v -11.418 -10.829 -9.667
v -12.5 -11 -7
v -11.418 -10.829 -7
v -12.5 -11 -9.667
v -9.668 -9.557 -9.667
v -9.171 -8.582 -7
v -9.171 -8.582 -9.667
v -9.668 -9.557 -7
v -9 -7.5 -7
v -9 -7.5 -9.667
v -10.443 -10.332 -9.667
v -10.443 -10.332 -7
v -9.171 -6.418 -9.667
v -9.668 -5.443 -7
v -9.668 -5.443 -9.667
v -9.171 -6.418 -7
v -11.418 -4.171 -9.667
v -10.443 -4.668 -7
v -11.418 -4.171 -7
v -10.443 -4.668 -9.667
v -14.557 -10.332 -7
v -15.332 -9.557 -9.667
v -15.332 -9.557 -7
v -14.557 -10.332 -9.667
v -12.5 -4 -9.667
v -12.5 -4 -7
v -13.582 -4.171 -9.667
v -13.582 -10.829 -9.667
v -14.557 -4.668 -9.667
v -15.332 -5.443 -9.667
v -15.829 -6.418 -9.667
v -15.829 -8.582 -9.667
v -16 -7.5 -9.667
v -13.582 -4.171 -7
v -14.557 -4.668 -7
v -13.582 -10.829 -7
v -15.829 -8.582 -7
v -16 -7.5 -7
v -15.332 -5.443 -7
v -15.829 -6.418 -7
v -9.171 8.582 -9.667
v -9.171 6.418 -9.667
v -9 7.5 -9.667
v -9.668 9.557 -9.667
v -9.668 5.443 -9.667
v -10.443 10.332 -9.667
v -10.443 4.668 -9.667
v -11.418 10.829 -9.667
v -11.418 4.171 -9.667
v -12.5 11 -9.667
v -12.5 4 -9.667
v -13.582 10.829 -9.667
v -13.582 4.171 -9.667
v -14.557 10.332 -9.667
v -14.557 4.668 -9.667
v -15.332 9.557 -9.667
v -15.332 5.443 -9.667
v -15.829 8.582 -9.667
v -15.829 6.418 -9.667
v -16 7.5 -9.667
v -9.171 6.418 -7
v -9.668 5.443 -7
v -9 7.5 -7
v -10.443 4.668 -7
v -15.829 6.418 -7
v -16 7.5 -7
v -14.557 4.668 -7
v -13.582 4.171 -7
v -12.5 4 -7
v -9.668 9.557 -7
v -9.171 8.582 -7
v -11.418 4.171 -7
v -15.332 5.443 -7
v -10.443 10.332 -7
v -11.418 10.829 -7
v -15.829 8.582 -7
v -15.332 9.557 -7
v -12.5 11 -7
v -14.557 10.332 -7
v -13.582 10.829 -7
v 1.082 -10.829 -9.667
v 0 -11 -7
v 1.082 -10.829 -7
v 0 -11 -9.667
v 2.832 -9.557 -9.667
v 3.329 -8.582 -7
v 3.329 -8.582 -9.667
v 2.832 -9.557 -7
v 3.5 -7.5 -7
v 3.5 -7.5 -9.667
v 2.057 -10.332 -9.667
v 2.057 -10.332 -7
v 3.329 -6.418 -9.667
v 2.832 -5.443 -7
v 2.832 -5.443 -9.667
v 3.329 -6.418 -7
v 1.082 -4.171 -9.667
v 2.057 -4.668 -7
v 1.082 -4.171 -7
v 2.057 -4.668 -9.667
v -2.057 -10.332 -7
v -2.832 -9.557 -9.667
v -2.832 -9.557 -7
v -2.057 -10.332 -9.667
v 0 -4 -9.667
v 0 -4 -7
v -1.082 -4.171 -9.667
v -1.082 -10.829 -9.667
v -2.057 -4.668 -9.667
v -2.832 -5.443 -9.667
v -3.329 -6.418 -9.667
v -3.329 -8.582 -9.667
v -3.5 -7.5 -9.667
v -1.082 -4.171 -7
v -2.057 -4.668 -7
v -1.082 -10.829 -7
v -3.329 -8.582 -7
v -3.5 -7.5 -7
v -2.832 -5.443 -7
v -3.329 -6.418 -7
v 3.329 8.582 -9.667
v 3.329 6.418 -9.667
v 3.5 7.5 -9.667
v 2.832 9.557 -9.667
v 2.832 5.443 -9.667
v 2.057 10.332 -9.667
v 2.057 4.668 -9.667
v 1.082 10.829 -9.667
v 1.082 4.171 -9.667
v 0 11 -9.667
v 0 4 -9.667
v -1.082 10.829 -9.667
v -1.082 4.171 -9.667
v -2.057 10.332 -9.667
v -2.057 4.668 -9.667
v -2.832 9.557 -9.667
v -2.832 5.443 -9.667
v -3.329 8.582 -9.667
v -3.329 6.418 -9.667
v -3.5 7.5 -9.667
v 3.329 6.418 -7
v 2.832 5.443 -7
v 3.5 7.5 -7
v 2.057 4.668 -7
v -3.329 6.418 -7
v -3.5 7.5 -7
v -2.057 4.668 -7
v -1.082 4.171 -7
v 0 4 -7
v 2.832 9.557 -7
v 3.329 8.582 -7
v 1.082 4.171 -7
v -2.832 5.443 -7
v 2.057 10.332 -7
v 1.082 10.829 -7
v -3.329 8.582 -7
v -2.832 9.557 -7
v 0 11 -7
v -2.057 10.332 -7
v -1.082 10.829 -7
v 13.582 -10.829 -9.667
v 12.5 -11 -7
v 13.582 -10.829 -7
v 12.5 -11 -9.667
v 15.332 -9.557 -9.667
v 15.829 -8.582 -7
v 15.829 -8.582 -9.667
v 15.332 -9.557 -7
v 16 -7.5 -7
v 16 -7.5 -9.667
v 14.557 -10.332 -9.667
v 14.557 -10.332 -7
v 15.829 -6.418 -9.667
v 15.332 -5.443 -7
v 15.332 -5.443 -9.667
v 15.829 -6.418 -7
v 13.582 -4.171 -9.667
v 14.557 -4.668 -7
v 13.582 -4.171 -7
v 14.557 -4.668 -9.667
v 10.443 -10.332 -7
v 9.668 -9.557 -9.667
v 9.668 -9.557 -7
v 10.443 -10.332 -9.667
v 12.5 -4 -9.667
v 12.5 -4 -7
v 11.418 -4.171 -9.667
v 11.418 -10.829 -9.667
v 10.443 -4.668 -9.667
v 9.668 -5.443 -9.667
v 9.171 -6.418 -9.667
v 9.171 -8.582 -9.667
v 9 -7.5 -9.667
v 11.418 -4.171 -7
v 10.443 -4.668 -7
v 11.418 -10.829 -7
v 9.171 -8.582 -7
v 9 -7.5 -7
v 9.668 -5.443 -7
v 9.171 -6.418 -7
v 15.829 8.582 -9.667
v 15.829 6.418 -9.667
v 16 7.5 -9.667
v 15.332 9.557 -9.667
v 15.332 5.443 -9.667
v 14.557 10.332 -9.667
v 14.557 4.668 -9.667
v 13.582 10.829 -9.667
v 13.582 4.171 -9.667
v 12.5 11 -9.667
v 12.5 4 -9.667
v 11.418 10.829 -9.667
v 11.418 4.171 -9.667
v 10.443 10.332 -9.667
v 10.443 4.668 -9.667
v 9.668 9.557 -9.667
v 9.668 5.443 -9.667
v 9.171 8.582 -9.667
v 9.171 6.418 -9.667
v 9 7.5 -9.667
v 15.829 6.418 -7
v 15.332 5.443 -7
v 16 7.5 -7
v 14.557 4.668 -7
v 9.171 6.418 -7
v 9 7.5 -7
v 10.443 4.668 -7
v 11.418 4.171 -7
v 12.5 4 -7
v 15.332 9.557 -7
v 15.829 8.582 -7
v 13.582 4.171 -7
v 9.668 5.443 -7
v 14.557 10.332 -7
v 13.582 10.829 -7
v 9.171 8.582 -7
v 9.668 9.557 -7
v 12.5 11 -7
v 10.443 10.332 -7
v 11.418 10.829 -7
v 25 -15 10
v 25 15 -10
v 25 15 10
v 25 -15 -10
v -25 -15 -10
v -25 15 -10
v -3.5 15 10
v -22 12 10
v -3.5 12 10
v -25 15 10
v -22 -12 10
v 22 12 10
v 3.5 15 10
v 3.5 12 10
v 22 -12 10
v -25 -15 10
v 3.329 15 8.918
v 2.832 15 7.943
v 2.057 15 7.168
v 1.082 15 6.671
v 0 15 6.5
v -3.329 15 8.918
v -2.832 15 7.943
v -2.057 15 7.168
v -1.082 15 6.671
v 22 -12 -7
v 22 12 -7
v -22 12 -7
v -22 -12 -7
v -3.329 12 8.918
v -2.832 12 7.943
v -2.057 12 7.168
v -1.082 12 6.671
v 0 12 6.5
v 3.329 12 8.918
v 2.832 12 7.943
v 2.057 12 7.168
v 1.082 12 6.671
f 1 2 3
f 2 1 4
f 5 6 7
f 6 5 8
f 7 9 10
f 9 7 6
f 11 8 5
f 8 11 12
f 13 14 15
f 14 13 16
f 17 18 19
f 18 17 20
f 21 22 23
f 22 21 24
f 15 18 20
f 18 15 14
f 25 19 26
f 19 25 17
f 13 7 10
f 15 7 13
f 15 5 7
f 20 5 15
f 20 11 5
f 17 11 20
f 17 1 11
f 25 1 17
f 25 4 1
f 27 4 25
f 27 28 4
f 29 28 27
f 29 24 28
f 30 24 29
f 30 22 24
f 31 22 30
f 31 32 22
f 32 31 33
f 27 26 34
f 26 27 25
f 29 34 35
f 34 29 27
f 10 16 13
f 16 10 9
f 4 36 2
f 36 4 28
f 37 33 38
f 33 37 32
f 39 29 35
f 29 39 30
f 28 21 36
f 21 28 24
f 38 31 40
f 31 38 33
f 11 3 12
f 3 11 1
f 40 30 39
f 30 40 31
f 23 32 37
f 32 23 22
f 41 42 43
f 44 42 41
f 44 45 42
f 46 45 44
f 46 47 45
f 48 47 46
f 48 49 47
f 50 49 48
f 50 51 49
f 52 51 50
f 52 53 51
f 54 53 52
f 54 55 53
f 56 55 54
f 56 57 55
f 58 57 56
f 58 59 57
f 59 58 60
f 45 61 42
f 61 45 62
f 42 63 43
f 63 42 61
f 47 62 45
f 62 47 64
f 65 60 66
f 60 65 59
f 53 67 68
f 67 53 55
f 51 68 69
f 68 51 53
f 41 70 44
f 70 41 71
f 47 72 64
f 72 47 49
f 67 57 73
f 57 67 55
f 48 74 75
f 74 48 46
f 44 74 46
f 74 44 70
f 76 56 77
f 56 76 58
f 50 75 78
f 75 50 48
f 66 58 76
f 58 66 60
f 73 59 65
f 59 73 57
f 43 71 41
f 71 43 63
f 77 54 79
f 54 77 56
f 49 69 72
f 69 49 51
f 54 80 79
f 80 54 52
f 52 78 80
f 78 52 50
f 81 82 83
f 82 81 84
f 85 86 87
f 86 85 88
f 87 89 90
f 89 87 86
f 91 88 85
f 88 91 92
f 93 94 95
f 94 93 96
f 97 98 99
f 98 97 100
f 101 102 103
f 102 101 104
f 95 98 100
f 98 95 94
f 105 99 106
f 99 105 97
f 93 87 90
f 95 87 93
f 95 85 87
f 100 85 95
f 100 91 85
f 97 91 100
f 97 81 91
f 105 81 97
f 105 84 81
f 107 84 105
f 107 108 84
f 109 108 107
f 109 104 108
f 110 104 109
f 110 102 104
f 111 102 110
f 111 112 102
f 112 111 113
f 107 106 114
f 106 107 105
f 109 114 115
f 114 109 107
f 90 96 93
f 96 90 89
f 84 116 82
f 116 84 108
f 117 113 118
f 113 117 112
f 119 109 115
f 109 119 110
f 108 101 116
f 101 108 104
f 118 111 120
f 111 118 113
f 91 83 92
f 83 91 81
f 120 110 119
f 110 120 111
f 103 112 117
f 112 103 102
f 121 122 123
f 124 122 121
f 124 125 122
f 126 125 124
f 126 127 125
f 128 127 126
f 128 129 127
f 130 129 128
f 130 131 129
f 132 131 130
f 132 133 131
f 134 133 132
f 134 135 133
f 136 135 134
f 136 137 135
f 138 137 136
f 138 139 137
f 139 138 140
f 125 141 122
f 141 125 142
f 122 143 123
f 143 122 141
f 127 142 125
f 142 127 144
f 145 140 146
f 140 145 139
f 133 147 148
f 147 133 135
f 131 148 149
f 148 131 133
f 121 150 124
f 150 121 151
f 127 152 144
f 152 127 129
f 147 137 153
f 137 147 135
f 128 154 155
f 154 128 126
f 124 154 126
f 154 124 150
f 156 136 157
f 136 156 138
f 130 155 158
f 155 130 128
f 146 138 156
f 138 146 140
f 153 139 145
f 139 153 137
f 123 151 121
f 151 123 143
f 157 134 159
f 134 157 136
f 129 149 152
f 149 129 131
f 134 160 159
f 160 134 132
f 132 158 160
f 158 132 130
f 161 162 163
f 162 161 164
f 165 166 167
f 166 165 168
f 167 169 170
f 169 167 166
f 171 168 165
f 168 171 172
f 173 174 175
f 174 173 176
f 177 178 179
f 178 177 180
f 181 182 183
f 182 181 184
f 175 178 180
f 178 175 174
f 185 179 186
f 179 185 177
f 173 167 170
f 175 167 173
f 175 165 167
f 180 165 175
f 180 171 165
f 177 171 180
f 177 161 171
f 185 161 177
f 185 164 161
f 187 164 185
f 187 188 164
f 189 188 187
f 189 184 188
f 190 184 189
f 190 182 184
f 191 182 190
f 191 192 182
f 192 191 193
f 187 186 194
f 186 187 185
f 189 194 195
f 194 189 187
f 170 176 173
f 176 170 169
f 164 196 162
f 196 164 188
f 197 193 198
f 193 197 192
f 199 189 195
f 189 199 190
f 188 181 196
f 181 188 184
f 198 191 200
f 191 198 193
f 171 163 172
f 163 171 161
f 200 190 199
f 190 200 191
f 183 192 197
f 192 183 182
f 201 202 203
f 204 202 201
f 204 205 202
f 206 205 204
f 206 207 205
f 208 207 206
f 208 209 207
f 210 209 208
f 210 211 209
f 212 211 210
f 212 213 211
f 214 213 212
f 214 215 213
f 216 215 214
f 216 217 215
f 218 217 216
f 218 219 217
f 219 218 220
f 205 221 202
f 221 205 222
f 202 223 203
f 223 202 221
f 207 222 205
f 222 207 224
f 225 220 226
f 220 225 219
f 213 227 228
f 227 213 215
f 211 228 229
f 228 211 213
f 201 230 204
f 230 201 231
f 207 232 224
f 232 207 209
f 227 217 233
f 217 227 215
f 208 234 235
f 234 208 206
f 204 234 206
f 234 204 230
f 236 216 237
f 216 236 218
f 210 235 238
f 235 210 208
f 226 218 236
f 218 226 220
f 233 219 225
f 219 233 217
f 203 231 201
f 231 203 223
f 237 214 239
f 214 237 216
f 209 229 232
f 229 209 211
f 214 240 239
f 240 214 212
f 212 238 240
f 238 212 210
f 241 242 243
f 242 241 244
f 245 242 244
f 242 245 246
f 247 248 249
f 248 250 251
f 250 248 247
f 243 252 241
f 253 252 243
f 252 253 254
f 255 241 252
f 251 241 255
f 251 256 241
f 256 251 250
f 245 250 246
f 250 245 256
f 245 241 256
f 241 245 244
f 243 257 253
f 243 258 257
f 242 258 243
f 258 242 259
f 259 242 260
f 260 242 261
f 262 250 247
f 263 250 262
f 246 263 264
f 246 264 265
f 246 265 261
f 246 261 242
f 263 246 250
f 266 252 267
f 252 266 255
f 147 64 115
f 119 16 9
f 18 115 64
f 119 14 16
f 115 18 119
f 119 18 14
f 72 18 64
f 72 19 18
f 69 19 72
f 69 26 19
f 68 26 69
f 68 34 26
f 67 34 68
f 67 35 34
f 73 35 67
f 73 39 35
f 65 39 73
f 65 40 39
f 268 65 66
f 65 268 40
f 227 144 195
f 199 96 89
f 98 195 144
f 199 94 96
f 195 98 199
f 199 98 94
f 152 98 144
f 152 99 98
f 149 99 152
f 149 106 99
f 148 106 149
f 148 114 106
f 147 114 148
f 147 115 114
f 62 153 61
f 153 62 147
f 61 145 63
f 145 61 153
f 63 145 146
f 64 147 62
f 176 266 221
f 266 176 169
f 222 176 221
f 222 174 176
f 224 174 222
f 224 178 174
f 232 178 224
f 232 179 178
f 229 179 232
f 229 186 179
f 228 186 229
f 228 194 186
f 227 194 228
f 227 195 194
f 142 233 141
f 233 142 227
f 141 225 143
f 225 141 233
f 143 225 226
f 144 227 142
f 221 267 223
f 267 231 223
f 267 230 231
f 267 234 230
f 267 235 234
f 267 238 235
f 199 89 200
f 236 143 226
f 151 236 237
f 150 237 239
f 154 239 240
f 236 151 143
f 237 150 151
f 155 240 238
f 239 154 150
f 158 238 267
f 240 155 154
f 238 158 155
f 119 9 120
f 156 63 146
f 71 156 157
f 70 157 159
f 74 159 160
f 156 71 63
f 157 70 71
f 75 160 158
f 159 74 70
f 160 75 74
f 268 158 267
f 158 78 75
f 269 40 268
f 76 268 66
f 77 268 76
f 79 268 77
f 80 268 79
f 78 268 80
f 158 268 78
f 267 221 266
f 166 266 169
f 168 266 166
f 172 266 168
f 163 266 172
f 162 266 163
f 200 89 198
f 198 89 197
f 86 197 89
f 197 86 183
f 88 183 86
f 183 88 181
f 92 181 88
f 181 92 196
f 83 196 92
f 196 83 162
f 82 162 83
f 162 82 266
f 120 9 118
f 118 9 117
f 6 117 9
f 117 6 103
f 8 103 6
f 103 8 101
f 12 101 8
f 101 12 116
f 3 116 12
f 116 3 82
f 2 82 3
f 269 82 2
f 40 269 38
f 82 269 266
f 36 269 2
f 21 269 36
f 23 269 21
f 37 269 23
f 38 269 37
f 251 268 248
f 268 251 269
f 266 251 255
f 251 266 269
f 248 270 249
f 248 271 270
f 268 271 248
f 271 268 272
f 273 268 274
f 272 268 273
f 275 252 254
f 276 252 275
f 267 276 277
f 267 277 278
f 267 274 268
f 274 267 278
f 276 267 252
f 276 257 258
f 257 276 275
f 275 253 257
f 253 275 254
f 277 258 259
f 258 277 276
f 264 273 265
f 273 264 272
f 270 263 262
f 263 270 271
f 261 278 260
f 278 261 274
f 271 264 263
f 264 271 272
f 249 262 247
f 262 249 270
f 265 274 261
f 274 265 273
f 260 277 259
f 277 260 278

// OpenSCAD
width= 50;
depth= 30;
height = 20;
wall = 3;
diameter_button=7;
turnout_count=3;


rotate([180,0,0])
difference(){
cube([width, depth, height], center = true);

translate([0,0,-wall])
#cube([width-wall*2, depth-wall*2, height], center = true);
   translate([0,0,height/3-7])
   #buttons();
    
    translate([0,-depth/3,-10])
    rotate([90,0,0])
    hole();

}

module buttons(){
    
    gap = width/(turnout_count+1);
    all_gaps = gap*(turnout_count-1);
    
for(part=[0:turnout_count-1]){
    translate([gap*part - all_gaps/2,0, 0])
    turnhout();
}
}


module turnhout(){
    color("red")
    translate([0,depth/4, 0])
    hole();
    color("lime")
    translate([0,-depth/4, 0])
    hole();
    }

module hole(){
    cylinder(h=10, d = 7, $fn=20);
}
